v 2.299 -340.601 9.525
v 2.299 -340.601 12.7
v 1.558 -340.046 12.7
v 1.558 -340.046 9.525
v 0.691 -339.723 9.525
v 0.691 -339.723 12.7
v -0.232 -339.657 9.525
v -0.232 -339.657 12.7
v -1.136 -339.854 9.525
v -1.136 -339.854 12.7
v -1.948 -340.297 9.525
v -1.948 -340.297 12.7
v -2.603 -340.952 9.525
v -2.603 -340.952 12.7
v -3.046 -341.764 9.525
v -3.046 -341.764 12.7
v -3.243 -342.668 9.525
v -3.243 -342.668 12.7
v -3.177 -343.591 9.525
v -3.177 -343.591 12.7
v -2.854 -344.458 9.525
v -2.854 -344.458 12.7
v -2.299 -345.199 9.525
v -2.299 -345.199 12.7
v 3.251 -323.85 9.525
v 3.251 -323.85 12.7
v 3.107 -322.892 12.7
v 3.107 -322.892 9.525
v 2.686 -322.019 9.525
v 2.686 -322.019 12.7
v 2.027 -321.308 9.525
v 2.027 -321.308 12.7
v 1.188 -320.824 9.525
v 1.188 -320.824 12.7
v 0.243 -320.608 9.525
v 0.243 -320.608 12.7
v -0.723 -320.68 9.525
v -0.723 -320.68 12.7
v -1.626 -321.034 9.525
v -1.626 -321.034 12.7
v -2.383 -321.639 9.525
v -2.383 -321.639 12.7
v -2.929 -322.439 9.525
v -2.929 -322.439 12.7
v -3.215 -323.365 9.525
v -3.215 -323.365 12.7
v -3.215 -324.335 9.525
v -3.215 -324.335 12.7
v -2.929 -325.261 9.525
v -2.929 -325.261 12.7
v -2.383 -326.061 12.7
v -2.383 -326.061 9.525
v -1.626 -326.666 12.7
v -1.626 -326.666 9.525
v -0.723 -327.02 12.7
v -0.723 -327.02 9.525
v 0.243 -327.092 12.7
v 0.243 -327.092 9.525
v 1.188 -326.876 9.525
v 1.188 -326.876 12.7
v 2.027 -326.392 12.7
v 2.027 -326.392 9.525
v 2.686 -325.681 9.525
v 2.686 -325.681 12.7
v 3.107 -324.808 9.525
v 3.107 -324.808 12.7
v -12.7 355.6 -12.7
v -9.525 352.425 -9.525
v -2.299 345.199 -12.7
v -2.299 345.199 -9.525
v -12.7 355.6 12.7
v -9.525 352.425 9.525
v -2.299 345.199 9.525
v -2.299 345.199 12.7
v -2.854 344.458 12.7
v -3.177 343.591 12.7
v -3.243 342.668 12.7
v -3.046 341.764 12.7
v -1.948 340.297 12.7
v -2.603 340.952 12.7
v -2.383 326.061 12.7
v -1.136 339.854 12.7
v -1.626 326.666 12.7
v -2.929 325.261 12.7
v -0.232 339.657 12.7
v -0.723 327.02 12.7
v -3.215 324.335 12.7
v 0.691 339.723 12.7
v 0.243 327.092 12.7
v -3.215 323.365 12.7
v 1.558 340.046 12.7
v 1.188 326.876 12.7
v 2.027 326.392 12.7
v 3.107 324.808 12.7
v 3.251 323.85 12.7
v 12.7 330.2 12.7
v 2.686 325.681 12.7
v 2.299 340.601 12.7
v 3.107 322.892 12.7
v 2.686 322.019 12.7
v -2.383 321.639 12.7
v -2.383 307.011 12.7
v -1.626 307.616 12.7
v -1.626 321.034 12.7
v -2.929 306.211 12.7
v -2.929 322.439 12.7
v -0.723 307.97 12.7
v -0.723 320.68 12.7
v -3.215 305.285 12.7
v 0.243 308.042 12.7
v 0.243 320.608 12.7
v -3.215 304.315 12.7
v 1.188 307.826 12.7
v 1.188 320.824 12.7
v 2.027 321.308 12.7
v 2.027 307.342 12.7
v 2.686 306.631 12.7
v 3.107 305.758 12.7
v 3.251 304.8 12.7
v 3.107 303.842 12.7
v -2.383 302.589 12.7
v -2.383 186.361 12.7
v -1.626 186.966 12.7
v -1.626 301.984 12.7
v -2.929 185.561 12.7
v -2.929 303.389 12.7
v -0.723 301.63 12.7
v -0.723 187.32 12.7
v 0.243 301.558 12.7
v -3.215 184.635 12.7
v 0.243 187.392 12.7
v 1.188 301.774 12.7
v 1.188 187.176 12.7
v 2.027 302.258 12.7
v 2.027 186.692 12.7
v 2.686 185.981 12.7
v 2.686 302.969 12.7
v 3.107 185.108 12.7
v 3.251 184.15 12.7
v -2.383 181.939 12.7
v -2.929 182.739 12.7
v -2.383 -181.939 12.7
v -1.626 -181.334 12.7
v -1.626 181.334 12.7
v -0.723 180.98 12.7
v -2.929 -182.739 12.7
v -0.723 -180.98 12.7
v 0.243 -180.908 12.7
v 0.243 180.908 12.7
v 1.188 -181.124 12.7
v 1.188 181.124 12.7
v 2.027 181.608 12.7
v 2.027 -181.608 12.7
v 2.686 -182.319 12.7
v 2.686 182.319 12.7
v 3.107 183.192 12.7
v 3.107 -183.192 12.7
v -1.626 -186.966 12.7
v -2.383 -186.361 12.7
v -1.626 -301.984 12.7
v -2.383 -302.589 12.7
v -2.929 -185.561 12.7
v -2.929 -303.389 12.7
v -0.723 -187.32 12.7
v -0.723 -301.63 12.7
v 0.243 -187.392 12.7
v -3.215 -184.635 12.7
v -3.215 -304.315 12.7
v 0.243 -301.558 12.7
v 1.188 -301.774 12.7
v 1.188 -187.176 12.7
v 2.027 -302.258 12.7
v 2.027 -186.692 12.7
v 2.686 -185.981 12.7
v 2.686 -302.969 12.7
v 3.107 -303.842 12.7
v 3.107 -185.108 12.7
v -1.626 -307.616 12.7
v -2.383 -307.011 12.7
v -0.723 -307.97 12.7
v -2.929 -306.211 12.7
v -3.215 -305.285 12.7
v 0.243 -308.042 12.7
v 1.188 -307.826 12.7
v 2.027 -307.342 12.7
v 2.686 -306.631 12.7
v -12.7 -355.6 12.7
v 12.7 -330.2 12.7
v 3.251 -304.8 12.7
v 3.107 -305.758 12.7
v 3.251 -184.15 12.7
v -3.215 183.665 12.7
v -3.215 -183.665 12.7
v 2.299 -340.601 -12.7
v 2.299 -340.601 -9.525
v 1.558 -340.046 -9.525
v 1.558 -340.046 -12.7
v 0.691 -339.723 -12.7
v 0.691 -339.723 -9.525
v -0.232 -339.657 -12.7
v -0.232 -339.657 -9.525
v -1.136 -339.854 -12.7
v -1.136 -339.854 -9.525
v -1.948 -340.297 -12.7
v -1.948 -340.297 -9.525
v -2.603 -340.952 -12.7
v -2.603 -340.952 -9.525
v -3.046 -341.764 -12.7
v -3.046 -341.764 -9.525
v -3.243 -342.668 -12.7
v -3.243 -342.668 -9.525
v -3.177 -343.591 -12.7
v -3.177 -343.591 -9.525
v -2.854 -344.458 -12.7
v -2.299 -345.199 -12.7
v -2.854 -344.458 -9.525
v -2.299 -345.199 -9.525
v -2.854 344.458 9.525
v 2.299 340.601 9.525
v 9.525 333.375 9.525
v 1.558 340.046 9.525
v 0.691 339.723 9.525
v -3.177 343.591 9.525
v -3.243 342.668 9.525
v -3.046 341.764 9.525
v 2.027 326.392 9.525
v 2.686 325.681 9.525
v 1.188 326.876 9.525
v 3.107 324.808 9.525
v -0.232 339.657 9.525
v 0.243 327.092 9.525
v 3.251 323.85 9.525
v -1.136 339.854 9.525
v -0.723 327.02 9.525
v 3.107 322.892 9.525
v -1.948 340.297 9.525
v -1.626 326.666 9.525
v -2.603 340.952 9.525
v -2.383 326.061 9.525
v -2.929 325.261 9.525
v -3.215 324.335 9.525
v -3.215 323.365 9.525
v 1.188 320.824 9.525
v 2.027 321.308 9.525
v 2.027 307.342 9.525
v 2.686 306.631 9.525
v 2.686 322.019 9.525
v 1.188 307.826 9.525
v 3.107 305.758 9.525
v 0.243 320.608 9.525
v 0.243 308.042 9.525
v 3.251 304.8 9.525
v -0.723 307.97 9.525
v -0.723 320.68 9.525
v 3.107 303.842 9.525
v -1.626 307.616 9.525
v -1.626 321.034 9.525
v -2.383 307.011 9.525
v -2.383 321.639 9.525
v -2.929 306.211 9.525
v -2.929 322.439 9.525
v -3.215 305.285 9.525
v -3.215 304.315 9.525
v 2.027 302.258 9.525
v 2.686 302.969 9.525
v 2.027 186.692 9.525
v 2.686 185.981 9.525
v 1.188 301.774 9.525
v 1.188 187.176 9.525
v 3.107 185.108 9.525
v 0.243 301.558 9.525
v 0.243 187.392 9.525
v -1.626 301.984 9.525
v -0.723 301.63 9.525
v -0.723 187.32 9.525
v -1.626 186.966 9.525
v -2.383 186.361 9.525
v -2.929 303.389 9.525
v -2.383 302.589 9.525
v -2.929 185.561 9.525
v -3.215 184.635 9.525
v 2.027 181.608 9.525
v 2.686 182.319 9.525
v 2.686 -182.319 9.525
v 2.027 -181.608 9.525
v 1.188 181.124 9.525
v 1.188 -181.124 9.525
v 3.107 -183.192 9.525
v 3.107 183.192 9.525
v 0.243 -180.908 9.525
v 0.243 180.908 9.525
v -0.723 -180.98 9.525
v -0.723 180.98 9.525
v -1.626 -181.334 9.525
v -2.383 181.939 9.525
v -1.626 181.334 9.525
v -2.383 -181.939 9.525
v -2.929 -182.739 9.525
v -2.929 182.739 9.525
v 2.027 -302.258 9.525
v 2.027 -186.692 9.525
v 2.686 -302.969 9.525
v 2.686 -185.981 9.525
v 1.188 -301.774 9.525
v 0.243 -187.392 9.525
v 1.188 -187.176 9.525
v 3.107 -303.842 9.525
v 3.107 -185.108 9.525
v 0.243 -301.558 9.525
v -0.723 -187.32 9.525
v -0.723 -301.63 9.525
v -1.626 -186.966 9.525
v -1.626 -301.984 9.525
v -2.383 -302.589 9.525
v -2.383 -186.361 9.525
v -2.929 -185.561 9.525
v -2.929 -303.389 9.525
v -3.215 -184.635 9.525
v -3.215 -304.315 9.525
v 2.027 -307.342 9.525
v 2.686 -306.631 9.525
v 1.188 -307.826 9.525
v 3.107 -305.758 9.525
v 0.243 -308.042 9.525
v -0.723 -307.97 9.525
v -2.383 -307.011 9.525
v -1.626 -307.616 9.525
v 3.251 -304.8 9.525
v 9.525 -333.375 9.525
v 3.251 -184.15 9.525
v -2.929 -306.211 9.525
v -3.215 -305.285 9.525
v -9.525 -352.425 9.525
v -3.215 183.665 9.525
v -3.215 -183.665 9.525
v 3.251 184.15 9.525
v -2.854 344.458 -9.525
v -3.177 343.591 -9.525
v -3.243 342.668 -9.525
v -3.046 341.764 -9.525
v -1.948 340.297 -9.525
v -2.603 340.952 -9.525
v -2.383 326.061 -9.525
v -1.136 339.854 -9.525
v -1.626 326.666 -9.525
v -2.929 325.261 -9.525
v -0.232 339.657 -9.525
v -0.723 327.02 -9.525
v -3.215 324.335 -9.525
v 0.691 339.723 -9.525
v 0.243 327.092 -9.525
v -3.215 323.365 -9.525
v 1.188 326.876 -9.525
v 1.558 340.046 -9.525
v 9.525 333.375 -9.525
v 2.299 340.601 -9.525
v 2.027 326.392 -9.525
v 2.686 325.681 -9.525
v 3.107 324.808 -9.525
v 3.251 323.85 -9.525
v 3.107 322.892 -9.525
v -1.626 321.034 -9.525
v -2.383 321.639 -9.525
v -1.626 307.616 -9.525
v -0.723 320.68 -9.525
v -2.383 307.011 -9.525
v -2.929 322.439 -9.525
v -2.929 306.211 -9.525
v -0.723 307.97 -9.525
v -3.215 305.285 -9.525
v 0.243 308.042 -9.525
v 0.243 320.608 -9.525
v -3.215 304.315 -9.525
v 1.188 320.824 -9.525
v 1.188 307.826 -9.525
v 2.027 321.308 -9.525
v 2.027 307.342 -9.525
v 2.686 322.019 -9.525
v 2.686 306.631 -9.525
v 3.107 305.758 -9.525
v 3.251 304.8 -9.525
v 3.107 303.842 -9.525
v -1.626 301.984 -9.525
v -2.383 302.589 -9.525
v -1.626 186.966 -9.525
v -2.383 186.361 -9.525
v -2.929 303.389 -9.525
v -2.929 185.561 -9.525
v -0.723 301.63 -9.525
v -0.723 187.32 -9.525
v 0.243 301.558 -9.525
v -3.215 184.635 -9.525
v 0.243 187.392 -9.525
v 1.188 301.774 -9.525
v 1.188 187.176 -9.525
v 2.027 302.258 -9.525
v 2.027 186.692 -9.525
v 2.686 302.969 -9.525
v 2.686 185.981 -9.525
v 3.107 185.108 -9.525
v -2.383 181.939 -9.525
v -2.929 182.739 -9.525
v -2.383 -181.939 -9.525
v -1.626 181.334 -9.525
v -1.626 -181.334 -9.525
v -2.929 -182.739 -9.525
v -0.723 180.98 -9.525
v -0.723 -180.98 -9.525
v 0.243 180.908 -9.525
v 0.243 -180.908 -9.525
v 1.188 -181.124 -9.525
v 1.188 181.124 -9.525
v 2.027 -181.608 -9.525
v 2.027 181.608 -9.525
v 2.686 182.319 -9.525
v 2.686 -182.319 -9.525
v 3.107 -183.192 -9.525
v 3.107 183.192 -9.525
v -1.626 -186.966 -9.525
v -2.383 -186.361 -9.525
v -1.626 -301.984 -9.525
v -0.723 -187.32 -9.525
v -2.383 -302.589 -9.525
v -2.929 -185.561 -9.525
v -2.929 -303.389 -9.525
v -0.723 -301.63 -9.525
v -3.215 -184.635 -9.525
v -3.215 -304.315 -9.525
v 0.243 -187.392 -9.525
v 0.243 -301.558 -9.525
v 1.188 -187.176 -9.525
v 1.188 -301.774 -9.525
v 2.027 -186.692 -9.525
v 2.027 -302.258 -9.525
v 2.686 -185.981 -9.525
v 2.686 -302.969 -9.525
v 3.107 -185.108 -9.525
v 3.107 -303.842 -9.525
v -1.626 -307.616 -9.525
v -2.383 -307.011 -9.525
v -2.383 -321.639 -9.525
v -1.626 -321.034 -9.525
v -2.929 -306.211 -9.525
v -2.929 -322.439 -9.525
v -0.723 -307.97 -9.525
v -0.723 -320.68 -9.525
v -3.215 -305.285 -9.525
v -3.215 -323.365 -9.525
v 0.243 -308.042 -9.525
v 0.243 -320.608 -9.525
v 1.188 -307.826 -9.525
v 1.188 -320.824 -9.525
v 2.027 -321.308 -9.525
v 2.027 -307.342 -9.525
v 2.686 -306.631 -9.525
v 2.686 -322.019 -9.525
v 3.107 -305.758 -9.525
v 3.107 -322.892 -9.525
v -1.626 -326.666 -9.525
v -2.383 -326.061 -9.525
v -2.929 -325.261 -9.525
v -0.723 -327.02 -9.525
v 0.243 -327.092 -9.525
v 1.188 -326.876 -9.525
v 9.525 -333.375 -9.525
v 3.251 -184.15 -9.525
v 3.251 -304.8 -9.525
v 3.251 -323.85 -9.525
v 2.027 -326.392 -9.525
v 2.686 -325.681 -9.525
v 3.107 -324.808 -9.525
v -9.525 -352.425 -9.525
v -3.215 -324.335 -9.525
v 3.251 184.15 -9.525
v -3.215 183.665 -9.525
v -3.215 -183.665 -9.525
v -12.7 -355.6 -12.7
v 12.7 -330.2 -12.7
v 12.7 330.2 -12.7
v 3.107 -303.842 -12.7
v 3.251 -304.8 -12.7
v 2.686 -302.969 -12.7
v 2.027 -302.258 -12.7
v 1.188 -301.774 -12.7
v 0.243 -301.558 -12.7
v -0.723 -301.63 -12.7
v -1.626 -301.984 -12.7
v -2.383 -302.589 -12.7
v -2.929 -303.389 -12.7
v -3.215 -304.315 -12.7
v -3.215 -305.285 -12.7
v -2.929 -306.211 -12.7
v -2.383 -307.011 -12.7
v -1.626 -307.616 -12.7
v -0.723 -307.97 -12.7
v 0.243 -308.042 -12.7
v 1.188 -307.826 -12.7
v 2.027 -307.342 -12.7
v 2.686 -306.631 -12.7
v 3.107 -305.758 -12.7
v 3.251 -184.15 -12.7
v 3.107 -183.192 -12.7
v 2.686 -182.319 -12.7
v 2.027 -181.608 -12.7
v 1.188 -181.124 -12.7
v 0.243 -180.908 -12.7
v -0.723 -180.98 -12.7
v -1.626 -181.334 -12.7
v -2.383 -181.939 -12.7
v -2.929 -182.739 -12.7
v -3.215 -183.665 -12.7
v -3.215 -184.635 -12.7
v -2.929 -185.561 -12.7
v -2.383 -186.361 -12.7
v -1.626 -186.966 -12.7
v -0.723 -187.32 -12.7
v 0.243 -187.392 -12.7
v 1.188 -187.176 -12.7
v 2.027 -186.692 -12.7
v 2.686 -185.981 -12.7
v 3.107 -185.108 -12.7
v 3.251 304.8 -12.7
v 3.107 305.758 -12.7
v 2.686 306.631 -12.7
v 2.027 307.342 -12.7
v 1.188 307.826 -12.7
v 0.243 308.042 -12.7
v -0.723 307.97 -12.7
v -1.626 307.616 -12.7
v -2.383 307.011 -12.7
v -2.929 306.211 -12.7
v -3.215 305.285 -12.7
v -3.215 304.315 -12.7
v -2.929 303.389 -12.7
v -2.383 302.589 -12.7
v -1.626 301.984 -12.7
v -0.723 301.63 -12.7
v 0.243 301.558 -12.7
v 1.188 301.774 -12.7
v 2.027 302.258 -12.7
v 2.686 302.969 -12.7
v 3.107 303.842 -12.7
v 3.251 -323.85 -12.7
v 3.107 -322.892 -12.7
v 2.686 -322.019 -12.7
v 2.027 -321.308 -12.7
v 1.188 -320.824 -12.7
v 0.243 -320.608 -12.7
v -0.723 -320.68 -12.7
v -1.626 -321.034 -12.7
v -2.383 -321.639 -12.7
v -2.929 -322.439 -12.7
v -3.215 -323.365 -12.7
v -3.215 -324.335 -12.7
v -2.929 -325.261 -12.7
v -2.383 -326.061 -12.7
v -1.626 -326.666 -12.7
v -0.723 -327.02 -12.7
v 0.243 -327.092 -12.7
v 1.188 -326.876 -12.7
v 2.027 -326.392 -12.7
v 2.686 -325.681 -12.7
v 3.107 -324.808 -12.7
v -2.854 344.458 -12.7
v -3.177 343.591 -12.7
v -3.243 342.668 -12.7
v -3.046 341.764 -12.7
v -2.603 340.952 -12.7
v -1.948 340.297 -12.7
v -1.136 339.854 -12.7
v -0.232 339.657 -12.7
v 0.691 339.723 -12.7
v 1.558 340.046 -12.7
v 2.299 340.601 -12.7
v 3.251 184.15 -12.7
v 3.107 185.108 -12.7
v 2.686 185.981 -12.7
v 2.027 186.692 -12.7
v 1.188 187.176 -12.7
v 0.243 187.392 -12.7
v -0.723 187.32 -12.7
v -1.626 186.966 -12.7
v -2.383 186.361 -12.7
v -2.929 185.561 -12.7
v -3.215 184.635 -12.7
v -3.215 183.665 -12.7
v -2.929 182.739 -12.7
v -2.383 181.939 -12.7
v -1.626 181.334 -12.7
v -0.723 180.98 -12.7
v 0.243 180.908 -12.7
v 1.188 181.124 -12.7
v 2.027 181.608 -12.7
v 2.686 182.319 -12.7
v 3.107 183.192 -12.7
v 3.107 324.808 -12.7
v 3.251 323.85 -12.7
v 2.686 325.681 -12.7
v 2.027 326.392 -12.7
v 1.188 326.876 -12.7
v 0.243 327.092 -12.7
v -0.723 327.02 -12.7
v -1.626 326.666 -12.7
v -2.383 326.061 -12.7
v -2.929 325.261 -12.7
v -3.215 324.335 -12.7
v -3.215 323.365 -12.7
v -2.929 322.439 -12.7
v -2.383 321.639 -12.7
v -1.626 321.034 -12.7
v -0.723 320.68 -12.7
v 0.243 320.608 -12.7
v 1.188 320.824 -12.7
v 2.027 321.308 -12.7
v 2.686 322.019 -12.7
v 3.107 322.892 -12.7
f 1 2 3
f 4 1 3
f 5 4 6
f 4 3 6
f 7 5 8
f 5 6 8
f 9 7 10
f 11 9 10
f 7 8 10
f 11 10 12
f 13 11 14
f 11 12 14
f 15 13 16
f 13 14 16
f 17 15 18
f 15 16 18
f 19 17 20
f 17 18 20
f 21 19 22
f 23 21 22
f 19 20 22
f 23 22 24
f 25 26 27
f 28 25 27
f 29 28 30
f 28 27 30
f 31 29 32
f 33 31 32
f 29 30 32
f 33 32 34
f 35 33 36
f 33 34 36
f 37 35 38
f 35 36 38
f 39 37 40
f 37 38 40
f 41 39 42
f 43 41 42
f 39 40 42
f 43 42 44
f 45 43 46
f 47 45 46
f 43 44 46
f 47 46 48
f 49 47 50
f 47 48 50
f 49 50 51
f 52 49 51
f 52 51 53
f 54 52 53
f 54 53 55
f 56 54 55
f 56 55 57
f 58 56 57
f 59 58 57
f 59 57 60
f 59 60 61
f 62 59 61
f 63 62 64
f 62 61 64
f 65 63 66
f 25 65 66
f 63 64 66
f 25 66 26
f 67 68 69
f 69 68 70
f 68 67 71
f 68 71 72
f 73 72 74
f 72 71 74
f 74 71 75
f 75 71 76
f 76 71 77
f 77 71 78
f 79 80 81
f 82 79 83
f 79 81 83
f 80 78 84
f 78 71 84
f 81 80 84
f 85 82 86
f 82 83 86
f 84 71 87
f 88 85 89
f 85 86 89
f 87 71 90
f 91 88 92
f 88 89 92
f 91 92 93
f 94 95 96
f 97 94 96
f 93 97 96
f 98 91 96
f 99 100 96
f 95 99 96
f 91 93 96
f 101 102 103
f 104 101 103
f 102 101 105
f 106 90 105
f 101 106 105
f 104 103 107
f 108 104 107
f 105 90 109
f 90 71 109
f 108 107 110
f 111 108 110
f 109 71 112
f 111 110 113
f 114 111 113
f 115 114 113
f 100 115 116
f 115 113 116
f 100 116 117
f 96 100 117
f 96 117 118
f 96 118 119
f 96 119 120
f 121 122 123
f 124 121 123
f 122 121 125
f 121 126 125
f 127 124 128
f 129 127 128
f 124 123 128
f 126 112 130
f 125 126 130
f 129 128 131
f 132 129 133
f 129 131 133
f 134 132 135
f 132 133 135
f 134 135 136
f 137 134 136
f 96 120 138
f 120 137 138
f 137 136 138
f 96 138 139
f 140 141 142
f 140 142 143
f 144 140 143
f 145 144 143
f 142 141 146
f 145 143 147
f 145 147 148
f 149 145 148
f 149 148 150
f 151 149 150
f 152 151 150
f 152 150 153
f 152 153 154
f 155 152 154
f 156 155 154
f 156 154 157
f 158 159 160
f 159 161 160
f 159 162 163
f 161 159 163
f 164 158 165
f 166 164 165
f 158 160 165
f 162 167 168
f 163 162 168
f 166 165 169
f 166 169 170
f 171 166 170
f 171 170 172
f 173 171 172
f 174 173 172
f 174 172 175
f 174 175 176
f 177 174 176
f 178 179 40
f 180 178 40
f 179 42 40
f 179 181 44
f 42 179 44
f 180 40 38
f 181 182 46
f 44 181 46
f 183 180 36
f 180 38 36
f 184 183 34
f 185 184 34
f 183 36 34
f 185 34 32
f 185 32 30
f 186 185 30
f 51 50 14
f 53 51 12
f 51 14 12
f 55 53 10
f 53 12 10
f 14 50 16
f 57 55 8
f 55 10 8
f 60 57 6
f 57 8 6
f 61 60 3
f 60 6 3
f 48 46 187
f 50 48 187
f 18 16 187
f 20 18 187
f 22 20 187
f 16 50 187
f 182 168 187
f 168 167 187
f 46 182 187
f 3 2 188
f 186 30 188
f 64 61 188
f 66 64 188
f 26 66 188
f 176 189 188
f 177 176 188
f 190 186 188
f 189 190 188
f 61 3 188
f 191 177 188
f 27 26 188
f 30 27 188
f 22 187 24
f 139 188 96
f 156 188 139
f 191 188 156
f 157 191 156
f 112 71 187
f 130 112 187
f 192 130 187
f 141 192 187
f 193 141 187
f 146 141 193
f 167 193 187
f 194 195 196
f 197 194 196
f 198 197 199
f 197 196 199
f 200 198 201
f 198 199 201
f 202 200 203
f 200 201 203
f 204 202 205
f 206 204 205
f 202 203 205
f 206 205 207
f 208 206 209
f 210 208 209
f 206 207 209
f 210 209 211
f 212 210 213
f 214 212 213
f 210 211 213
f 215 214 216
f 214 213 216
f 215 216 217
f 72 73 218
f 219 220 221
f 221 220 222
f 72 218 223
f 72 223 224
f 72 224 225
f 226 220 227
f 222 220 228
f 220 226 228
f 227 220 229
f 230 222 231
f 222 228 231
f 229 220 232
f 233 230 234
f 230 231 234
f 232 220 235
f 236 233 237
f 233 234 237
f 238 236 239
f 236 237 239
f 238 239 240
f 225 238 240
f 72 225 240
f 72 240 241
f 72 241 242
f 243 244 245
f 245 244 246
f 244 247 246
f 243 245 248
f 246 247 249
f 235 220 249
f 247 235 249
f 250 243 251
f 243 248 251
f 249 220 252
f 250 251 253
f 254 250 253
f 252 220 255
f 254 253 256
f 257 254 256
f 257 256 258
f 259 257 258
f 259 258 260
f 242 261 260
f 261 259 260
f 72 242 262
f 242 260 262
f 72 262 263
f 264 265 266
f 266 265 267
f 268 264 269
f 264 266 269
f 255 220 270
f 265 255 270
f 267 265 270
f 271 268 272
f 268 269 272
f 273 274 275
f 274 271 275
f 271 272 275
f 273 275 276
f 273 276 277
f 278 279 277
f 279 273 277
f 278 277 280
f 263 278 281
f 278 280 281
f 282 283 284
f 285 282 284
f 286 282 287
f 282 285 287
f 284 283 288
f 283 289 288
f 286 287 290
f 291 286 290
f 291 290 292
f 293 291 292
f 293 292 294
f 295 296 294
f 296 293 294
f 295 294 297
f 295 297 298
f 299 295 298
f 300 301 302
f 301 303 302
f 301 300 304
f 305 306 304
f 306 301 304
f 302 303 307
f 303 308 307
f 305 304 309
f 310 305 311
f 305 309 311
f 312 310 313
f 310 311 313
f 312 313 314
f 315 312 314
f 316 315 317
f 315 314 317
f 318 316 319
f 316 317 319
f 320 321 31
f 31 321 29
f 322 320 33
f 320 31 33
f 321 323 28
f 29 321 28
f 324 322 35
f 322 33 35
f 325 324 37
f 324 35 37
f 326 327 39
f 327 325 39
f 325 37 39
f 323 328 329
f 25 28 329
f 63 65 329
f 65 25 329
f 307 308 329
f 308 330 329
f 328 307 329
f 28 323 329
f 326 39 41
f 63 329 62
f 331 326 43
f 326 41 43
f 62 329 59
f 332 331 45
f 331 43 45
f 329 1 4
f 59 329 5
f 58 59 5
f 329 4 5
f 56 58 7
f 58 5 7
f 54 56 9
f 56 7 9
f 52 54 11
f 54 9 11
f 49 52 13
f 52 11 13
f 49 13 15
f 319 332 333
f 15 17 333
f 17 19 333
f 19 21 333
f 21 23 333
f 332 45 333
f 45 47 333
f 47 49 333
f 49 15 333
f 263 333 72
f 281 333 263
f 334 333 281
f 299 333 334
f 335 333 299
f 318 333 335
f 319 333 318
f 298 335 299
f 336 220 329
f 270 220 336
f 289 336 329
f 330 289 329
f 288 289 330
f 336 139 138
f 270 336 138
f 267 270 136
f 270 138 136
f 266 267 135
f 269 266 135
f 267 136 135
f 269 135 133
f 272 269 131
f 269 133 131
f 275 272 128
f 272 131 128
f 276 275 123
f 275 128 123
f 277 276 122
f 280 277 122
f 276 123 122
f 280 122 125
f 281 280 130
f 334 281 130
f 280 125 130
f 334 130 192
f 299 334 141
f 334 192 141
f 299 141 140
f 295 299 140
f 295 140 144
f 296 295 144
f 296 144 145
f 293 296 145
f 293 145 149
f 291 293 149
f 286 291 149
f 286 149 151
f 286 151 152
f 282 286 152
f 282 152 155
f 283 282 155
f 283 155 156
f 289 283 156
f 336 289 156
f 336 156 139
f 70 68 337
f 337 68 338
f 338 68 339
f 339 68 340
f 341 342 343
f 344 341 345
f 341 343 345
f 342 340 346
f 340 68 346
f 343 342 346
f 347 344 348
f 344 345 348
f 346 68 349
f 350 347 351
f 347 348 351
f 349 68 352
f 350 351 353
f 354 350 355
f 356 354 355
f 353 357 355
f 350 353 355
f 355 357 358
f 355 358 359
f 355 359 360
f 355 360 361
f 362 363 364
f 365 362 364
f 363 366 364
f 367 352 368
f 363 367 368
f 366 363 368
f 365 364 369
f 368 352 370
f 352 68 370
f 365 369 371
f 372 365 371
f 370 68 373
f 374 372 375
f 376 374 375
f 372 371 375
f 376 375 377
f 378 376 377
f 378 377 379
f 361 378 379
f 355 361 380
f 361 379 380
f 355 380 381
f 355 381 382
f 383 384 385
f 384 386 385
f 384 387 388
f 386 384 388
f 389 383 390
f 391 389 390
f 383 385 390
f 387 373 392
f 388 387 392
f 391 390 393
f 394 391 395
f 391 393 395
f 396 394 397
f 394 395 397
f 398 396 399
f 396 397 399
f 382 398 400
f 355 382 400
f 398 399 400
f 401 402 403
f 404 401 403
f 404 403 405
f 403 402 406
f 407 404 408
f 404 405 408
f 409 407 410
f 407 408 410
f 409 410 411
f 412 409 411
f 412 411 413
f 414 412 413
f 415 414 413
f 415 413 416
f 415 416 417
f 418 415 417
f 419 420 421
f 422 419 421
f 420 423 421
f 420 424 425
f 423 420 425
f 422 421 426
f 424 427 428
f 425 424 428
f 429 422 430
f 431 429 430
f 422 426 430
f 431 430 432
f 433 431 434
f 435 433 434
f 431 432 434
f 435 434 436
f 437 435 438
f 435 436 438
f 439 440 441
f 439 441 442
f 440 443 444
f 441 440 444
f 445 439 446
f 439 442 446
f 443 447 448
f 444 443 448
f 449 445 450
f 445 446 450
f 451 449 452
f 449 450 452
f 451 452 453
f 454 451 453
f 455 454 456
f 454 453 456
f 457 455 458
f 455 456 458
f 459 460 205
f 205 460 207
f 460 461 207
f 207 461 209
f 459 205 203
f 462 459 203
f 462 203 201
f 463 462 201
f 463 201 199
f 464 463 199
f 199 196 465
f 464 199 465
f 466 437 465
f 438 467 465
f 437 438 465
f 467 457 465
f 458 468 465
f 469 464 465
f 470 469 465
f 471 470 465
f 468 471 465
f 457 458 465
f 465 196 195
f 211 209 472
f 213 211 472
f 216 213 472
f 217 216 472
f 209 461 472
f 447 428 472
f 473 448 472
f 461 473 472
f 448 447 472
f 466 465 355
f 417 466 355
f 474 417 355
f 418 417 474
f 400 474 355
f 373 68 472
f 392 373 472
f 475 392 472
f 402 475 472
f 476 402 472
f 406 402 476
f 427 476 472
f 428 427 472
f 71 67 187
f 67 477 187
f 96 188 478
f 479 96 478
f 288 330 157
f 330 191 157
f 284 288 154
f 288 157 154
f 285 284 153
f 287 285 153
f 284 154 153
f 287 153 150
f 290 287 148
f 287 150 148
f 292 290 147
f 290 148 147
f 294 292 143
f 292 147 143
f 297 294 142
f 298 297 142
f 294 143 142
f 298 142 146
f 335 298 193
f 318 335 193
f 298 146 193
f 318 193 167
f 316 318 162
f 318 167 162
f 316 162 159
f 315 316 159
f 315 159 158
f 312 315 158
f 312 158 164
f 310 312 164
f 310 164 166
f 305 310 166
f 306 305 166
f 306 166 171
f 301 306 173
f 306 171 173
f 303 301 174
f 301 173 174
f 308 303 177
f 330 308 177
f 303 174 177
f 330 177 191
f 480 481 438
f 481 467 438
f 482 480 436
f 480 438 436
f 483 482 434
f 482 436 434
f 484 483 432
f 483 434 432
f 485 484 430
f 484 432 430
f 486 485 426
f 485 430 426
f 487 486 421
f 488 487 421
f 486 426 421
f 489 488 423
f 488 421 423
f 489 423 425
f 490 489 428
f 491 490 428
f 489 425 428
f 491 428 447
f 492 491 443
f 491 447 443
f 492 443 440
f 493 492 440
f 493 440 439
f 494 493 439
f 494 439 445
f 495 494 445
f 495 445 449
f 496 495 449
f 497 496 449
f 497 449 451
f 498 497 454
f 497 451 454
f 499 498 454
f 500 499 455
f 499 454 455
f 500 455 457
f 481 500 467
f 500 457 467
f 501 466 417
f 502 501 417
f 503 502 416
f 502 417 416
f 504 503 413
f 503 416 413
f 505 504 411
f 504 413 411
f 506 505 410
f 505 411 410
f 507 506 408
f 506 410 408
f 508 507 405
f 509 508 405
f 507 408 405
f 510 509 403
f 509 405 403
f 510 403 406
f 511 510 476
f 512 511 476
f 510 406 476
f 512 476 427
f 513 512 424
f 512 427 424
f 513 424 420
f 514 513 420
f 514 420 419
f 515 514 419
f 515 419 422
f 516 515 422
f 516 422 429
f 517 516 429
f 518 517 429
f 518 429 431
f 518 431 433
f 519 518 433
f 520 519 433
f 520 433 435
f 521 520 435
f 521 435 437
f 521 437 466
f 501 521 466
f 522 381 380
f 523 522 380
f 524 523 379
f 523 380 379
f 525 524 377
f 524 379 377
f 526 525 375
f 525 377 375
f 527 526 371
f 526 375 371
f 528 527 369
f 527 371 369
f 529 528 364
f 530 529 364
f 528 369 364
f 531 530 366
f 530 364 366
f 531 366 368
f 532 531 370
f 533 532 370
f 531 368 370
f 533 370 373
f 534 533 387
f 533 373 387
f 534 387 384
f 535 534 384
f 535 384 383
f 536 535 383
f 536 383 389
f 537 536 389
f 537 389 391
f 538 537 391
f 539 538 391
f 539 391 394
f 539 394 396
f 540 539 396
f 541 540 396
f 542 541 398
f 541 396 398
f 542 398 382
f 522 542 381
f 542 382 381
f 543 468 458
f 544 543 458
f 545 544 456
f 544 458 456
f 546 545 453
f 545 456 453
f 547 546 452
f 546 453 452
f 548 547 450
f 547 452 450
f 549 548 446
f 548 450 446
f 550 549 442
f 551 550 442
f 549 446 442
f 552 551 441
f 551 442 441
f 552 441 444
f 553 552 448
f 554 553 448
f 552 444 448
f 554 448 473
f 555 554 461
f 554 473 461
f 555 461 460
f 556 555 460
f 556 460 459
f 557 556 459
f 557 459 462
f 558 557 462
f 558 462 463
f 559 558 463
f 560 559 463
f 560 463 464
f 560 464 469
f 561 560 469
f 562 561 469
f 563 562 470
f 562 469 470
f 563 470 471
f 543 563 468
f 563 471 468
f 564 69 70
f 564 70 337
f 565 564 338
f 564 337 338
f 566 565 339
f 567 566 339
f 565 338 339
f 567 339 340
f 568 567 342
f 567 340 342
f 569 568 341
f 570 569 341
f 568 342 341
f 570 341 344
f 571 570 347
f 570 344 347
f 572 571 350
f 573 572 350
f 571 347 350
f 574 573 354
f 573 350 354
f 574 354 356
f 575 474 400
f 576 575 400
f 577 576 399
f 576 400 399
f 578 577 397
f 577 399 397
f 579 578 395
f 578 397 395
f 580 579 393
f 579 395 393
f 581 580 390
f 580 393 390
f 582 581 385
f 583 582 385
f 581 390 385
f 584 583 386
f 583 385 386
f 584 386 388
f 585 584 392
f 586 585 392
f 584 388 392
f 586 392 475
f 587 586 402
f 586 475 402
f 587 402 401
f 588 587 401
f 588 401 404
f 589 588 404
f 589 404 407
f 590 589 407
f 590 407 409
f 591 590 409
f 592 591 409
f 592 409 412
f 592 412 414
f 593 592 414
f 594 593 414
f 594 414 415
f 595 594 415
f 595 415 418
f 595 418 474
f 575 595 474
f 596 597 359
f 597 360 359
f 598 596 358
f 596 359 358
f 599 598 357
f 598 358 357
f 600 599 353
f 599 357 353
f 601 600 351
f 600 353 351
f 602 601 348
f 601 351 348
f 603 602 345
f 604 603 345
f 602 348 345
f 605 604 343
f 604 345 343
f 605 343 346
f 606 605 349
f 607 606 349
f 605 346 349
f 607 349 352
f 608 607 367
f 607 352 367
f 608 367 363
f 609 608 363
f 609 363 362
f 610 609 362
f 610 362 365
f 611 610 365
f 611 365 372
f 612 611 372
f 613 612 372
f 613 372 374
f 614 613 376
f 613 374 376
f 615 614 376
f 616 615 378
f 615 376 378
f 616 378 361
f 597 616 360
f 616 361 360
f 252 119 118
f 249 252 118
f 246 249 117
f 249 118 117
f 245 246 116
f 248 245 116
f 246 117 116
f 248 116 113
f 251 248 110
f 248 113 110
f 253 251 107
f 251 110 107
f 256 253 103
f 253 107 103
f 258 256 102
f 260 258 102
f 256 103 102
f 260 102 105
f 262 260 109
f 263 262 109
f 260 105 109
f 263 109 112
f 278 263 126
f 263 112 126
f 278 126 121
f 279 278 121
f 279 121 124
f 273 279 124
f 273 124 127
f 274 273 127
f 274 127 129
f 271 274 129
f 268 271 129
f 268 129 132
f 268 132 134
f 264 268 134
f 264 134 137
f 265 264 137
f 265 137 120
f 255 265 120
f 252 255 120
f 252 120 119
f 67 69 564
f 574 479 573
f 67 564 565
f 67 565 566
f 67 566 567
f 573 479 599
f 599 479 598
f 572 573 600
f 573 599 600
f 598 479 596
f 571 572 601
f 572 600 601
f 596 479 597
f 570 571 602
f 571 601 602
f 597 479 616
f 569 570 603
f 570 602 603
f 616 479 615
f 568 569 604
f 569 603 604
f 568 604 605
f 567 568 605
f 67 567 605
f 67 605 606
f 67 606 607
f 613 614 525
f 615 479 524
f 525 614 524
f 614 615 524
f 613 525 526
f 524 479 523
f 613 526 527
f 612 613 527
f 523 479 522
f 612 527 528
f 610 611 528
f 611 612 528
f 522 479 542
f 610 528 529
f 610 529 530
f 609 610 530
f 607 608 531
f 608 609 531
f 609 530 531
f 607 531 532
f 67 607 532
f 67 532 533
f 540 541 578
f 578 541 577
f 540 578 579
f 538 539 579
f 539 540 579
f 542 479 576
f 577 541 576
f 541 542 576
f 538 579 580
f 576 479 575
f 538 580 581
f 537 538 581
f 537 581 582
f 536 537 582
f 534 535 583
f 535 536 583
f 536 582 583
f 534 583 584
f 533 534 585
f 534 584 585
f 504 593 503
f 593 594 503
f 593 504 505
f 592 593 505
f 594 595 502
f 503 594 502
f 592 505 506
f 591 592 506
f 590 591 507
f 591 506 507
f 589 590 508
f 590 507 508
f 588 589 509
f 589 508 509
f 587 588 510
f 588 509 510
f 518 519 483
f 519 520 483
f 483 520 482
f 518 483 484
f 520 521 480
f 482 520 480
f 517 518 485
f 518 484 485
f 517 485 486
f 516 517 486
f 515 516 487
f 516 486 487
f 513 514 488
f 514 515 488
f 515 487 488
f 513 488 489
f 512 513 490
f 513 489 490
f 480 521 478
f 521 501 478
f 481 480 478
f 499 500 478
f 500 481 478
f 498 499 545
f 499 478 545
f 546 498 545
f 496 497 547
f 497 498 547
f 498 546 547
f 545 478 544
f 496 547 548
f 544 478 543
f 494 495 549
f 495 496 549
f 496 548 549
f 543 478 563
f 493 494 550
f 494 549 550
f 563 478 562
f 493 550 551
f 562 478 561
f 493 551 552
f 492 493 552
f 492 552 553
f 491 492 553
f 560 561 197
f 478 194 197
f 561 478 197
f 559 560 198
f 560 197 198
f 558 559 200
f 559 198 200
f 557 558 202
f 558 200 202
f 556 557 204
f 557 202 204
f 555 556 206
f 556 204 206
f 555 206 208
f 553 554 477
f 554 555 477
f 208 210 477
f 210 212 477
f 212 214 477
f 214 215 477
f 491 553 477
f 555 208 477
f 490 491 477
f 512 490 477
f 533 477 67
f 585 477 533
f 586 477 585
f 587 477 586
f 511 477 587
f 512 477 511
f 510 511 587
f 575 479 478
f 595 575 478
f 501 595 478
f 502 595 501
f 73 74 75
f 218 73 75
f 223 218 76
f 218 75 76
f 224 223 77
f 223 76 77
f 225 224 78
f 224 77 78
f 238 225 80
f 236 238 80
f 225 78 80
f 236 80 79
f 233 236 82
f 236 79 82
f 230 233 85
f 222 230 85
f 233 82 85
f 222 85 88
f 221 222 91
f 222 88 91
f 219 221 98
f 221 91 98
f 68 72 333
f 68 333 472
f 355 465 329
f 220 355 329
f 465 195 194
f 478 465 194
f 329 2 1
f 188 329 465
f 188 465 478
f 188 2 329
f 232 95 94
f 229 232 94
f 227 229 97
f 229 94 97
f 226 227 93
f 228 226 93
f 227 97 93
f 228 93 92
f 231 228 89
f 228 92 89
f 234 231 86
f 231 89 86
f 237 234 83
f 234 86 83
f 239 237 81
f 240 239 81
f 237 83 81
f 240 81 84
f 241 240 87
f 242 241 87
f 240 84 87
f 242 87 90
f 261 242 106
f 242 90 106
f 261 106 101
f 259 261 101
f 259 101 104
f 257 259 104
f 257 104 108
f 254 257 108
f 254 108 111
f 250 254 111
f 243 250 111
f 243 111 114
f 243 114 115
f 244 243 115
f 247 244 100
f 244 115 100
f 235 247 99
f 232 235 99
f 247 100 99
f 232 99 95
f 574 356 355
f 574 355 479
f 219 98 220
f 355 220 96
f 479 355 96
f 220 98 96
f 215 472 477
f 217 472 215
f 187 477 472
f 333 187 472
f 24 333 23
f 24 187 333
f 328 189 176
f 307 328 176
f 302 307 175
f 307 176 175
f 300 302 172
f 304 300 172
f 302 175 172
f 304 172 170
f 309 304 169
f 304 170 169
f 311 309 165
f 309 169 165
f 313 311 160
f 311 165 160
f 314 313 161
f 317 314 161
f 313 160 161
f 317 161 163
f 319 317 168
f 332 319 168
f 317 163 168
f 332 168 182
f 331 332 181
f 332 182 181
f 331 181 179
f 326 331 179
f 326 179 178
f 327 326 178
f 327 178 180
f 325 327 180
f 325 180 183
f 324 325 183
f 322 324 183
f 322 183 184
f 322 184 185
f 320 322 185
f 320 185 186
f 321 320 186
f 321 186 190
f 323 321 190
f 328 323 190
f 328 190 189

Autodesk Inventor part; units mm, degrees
ref_plane "YZ Plane" through (0, 0, 0) normal (1, 0, 0) x (0, 1, 0)
ref_plane "XZ Plane" through (0, 0, 0) normal (0, 1, 0) x (-1, 0, 0)
ref_plane "XY Plane" through (0, 0, 0) normal (0, 0, 1) x (1, 0, 0)
sketch "Sketch1" plane through (0, 0, 0) normal (0, 1, 0) x (-1, 0, 0)
  line L0 (-12.7, -12.7) -> (12.7, -12.7)
  line L1 (12.7, -12.7) -> (12.7, 12.7)
  line L2 (12.7, 12.7) -> (-12.7, 12.7)
  line L3 (-12.7, 12.7) -> (-12.7, -12.7)
  line L4 (-12.7, -12.7) -> (12.7, 12.7) construction
  line L5 (12.7, -12.7) -> (-12.7, 12.7) construction
  line L6 (9.525, 9.525) -> (9.525, -9.525)
  line L7 (9.525, -9.525) -> (-9.525, -9.525)
  line L8 (-9.525, -9.525) -> (-9.525, 9.525)
  line L9 (-9.525, 9.525) -> (9.525, 9.525)
  point P0 (0, 0)
  dimension "d0" = 25.4
  dimension "d1" = 25.4
  dimension "d2" = 3.175
extrude "Extrusion1" add sketch "Sketch1" along normal mid plane 711.2
sketch "Sketch2" plane through (-12.7, 355.6, 12.7) normal (0, 0, 1) x (1, 0, 0)
  line L0 (0, 0) -> (25.4, 0) projected
  line L1 (0, 0) -> (25.4, -25.4)
  line L2 (25.4, -711.2) -> (25.4, 0) projected
  circle A0 centre (12.7, -31.75) radius 3.2512
  circle A1 centre (12.7, -50.8) radius 3.2512
  line L3 (0, -711.2) -> (0, 0) projected
  line L4 (0, -355.6) -> (25.4, -355.6) construction
  line L5 (0, -711.2) -> (25.4, -711.2)
  line L6 (0, -711.2) -> (25.4, -685.8)
  circle A2 centre (12.7, -679.45) radius 3.2512
  circle A3 centre (12.7, -660.4) radius 3.2512
  circle A4 centre (12.7, -12.7) radius 3.2512
  circle A5 centre (12.7, -698.5) radius 3.2512
  point P0 (12.7, -355.6)
  point P1 (12.7, 0)
  point P2 (12.7, -711.2)
  point P3 (14.9989, -14.9989)
  point P4 (10.4011, -10.4011)
  point P5 (14.9989, -696.2011)
  point P6 (10.4011, -700.7989)
  dimension "d5" = 25.4
  dimension "d6" = 6.5024
  dimension "d7" = 31.75
  dimension "d8" = 19.05
extrude "Extrusion2" cut sketch "Sketch2" against normal blind 711.2 contours L0 L2 L1 A4 | A4 L1 | L1 A4 | L6 A5 L2 L5 | A5 L6 | L6 A5 | A0 | A1 | A2 | A3
sketch "Sketch3" plane through (-12.7, -355.6, 12.7) normal (0, 0, 1) x (1, 0, 0)
  line L0 (0, 711.2) -> (0, 0) construction
  line L1 (0, 355.6) -> (25.4, 355.6) construction
  line L2 (25.4, 25.4) -> (25.4, 685.8) construction
  circle A0 centre (12.7, 171.45) radius 3.2512
  circle A1 centre (12.7, 539.75) radius 3.2512
  point P0 (12.7, 355.6)
  dimension "d14" = 6.5024
  dimension "d15" = 184.15
  dimension "d16" = 146.05
extrude "Extrusion3" cut sketch "Sketch3" against normal blind 25.4
properties part number "STRU_003_BilletPole_28in_Angled" material "Aluminum 6061"
